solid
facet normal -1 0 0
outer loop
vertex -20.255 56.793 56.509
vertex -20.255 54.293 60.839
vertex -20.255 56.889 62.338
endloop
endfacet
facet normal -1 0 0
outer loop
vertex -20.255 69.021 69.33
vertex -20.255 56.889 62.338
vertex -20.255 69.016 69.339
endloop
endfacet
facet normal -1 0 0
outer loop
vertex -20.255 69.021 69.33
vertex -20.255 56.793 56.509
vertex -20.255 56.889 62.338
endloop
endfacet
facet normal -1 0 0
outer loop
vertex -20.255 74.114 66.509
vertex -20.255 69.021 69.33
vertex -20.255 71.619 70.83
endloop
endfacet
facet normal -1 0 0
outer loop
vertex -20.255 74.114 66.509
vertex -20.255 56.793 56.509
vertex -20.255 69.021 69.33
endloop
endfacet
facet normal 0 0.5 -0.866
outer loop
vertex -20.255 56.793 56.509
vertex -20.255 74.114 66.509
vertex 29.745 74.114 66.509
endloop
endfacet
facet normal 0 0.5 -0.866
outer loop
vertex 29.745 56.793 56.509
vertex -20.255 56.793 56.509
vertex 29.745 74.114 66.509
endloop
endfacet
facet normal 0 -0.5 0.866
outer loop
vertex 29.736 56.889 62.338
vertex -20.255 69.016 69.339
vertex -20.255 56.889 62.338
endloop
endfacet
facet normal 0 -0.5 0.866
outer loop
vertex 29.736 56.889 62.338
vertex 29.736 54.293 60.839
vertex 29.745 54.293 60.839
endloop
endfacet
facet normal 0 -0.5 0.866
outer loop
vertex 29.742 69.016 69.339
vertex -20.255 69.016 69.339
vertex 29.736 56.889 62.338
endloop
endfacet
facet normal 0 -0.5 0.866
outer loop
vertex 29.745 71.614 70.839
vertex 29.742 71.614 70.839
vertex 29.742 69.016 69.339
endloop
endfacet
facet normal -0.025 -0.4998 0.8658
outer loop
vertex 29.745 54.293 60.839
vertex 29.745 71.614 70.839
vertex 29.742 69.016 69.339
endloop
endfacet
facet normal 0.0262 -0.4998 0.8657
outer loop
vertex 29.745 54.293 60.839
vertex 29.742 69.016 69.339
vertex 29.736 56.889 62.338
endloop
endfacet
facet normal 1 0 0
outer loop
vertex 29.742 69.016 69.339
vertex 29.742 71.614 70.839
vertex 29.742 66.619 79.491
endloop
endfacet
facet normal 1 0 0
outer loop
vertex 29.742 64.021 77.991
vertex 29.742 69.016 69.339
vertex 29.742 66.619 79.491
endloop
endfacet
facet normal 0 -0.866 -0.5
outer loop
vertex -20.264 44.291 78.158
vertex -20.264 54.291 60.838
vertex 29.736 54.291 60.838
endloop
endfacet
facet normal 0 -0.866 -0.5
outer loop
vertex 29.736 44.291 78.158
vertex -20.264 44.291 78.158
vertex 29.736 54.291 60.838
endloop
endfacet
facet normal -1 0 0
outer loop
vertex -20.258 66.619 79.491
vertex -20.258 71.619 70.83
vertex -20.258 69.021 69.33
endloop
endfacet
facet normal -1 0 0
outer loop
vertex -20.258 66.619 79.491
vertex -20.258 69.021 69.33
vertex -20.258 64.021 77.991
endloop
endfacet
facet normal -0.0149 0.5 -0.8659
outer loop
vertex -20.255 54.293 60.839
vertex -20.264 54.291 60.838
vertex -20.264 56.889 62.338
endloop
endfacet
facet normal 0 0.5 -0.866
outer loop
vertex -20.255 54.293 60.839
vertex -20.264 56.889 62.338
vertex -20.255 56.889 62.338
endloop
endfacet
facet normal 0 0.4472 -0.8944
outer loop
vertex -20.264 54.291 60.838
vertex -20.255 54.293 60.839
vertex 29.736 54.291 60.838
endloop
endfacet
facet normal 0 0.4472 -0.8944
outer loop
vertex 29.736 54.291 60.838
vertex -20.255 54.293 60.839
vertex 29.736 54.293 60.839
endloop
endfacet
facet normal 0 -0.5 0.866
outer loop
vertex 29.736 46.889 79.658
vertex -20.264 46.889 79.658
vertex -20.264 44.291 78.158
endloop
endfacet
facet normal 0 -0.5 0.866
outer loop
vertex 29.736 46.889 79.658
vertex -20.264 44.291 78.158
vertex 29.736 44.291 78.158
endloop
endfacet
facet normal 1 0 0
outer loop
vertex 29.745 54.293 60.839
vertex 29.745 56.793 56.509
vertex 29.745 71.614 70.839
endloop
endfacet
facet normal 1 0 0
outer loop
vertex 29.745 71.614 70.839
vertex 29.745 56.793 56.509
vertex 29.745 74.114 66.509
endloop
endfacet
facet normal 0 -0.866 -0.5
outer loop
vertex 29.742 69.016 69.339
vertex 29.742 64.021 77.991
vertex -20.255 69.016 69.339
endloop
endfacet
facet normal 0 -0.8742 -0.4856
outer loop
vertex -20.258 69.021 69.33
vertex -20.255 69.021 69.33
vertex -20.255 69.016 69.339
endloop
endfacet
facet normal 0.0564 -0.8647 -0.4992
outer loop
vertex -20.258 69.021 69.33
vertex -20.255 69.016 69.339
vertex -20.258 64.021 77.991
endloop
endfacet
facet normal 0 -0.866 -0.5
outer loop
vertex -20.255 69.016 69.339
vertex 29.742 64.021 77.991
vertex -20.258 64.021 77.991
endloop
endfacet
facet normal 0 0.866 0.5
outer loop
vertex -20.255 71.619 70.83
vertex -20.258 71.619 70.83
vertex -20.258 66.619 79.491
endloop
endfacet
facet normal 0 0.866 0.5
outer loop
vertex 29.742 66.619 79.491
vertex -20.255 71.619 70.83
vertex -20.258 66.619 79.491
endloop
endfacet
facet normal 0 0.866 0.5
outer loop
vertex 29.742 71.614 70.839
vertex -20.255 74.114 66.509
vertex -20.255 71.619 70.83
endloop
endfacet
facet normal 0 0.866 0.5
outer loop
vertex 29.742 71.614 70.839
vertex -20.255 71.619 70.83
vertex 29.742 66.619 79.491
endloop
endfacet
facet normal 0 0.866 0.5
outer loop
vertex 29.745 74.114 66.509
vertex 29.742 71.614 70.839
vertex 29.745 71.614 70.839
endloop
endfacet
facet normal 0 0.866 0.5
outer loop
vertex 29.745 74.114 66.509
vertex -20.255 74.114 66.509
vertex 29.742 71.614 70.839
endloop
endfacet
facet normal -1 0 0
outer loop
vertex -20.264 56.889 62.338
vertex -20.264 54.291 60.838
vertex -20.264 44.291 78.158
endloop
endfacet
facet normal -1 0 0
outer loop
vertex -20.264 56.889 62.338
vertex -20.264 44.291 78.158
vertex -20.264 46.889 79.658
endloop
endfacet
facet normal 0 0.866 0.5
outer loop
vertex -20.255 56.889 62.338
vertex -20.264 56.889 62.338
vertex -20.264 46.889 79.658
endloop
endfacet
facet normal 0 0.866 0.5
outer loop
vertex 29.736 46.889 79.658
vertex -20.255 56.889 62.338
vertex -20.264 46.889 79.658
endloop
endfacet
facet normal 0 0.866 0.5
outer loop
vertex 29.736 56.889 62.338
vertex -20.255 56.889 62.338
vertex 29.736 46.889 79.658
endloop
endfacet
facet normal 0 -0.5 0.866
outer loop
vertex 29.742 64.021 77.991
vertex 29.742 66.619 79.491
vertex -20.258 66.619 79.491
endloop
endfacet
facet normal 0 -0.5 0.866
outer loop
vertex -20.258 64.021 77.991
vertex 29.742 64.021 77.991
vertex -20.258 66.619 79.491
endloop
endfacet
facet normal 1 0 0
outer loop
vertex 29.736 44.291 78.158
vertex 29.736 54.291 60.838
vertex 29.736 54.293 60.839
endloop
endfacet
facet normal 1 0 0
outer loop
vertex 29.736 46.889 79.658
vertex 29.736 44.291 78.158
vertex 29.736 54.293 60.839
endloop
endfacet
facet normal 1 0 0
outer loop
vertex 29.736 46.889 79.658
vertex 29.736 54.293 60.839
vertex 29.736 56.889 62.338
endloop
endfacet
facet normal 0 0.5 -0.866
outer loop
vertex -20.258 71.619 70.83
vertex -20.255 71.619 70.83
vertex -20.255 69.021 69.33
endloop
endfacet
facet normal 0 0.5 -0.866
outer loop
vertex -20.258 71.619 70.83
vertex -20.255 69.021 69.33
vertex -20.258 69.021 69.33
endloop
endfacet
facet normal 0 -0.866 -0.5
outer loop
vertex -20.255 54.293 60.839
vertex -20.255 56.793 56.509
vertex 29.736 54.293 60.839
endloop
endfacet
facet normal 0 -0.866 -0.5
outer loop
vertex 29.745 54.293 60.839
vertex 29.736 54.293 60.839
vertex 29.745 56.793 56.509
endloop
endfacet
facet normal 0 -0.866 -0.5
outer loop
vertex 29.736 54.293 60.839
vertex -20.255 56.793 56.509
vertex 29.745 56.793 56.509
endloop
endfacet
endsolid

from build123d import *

# Parameters (mm, degrees)
SKETCH051_W             = 50
SKETCH051_H             = 20
PAD050_DEPTH            = 5
SKETCH052_W             = 50
SKETCH052_H             = 3
PAD051_DEPTH            = 20
SKETCH053_W             = 50
SKETCH053_H             = 10
PAD052_DEPTH            = 3
BODY041_PLACEMENT_ANGLE = 30


with BuildPart() as part:
    # Sketch051 → Pad050 (new body)
    with BuildSketch(Plane.XY):
        with Locations((184.845276, -123.914059)):
            Rectangle(SKETCH051_W, SKETCH051_H)
    extrude(amount=PAD050_DEPTH)

    # Sketch052 (on Face6 of Pad050) → Pad051 (join)
    with BuildSketch(Plane.XY.offset(5)):
        with Locations((184.83606, -132.417099)):
            Rectangle(SKETCH052_W, SKETCH052_H)
    extrude(amount=PAD051_DEPTH)

    # Sketch053 (on Face7 of Pad051) → Pad052 (join)
    with BuildSketch(Plane(origin=(0, -113.914059, 0), x_dir=(-1, 0, 0), z_dir=(0, 1, 0))):
        with Locations((-184.841869, 9.989668)):
            Rectangle(SKETCH053_W, SKETCH053_H)
    extrude(amount=-PAD052_DEPTH)


with BuildPart() as part_1:
    # Body041 placement: moved
    add(part.part.moved(Location((-180.1, 172.766257, 123.466258))).rotate(Axis((-180.1, 172.766257, 123.466258), (1, 0, 0)), BODY041_PLACEMENT_ANGLE))


solid = part_1.part
